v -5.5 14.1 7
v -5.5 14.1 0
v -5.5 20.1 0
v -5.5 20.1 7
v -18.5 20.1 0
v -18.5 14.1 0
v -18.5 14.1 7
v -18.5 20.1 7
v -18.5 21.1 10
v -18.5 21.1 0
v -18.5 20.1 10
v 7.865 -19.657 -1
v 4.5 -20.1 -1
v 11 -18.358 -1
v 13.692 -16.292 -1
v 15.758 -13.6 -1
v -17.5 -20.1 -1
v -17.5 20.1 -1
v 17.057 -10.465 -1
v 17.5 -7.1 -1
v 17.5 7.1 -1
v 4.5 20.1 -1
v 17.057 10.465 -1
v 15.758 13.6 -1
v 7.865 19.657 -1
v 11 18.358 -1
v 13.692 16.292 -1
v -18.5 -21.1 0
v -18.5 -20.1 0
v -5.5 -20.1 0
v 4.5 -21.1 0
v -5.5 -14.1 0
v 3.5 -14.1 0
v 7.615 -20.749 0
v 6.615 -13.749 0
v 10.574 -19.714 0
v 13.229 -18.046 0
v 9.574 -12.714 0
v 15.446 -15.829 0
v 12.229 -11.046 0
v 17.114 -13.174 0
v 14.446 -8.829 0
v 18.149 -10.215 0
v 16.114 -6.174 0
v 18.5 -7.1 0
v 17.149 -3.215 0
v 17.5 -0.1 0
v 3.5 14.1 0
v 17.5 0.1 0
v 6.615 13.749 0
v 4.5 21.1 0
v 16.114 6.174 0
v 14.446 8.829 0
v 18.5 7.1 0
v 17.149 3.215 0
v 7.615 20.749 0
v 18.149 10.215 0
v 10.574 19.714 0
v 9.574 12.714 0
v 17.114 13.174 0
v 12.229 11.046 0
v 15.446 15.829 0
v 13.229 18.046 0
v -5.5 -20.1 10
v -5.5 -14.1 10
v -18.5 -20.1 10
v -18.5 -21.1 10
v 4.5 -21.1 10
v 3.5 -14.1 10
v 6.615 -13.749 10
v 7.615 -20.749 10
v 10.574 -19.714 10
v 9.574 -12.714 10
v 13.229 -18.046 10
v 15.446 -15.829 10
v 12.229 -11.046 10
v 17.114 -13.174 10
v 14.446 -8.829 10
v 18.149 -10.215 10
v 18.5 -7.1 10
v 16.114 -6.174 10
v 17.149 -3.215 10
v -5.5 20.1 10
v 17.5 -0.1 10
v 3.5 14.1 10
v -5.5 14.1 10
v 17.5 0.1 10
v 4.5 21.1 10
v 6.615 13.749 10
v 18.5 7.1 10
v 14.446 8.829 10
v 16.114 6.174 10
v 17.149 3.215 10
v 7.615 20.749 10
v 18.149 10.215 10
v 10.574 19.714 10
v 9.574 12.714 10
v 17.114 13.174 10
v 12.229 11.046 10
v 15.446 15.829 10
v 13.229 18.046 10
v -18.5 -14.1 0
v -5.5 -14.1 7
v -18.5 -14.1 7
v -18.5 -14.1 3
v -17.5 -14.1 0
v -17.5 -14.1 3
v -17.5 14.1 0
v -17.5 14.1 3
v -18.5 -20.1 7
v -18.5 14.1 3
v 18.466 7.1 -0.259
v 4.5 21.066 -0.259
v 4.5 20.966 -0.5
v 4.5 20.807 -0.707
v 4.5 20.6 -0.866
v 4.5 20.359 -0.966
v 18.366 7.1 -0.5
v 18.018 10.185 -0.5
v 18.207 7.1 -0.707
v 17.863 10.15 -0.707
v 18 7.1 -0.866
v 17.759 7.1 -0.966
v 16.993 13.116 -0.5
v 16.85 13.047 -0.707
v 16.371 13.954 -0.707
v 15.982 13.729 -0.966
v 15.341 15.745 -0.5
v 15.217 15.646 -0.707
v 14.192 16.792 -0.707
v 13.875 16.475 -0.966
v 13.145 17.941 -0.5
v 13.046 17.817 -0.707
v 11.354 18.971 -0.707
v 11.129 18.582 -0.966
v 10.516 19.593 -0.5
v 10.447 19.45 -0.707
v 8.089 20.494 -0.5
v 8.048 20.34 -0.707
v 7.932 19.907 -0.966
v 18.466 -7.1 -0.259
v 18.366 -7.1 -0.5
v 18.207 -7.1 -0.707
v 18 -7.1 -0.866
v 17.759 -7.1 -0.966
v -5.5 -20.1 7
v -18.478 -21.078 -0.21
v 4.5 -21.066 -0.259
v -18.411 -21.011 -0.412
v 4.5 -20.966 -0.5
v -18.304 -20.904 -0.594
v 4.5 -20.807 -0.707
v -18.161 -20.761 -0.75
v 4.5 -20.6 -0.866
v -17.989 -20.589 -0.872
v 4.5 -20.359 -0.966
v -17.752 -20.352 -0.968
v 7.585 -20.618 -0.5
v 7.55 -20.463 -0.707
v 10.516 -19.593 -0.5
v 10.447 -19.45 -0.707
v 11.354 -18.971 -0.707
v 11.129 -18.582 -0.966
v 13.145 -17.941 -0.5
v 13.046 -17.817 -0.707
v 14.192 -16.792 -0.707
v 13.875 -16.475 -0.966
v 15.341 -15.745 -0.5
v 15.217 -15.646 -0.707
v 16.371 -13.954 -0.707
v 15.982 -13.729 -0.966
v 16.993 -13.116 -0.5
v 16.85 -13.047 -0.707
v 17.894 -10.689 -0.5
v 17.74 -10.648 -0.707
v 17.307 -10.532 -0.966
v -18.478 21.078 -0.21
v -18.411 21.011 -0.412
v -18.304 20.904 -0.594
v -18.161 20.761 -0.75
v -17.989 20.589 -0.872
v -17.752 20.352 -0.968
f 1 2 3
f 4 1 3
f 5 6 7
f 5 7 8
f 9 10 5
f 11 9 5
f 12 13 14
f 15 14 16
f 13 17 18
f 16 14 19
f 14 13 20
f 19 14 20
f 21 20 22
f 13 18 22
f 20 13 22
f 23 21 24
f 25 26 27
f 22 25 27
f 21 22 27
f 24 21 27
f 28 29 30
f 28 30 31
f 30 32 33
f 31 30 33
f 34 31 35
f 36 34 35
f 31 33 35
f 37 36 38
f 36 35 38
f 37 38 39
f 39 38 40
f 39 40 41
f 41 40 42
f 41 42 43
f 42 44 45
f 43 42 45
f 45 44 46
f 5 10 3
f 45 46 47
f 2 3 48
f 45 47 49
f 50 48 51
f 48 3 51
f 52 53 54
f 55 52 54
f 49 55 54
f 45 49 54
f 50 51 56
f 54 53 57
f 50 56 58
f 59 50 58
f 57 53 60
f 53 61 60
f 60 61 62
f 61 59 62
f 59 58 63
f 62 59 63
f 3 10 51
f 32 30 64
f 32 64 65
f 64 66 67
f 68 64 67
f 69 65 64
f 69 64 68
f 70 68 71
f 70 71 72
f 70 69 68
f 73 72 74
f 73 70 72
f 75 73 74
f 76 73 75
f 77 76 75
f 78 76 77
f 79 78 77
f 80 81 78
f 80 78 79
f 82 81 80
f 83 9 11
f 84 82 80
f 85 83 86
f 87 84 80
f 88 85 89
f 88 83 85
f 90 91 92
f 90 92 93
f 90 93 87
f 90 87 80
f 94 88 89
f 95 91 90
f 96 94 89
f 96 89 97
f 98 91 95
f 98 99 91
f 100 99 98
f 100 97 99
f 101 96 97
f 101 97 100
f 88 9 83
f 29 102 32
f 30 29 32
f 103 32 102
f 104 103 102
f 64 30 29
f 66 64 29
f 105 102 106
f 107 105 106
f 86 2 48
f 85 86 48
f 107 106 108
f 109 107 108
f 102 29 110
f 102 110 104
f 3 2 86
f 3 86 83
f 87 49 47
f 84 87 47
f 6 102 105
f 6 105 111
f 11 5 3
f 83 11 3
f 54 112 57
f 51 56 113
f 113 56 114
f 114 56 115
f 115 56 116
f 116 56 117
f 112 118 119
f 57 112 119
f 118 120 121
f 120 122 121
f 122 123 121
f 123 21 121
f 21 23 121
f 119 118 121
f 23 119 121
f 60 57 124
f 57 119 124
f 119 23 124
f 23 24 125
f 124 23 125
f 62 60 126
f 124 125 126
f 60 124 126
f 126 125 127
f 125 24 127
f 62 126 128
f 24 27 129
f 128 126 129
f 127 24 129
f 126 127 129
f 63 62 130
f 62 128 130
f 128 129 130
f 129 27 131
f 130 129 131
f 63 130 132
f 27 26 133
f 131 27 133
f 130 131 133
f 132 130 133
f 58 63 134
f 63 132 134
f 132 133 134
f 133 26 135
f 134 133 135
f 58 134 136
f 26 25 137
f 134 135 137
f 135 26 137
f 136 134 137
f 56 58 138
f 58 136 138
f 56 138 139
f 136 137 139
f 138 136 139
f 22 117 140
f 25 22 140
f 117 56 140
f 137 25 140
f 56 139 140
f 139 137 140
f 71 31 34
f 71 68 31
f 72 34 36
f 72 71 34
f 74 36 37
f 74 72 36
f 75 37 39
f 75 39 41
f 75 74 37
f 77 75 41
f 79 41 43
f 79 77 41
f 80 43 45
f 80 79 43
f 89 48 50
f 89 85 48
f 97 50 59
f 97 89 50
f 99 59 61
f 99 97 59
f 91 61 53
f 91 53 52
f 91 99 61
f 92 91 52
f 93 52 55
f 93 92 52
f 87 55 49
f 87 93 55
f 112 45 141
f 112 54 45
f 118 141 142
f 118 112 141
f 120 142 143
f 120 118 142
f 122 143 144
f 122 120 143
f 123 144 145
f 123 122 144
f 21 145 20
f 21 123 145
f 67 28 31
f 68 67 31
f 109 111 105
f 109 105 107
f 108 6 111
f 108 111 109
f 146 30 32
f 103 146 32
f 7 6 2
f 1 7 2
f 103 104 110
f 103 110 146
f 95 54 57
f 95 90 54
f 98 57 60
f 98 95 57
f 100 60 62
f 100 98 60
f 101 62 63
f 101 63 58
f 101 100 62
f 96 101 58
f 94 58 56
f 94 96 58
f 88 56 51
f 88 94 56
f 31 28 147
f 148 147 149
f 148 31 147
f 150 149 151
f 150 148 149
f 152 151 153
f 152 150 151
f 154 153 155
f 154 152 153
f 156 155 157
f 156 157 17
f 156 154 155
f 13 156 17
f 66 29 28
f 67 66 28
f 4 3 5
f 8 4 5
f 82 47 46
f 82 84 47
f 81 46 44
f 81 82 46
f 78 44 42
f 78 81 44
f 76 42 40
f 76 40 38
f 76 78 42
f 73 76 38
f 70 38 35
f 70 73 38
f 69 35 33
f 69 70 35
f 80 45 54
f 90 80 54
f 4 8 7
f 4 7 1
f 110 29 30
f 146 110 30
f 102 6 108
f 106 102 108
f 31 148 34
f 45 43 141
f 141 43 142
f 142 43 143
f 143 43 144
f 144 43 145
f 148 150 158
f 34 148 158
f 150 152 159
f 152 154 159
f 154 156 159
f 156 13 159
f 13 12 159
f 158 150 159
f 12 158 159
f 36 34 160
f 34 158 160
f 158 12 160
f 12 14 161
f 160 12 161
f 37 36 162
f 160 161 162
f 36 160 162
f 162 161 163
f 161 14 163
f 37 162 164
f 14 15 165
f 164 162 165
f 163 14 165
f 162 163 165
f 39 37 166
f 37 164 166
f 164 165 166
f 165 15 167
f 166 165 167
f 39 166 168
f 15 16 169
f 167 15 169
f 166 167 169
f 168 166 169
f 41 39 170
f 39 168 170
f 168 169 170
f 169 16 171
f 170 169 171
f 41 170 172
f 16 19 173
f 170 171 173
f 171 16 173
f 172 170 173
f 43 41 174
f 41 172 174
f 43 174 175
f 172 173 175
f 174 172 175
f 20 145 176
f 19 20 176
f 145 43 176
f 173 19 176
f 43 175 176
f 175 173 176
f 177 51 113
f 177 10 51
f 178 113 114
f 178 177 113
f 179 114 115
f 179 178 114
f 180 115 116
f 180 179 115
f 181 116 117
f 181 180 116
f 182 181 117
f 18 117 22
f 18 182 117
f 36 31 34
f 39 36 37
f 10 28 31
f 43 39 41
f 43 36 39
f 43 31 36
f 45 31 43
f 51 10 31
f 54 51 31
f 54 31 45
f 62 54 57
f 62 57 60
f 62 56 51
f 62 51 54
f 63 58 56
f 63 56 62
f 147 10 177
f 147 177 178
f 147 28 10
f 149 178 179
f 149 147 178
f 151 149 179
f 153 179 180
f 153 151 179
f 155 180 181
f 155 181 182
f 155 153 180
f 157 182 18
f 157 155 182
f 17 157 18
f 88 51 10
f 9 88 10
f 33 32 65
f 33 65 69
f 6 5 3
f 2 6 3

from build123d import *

# Parameters (mm, degrees)
F0_W     = 1
F0_H     = 28.2
F1_DEPTH = 3
F0_H_2   = 6
F0_W_2   = 12
F2_DEPTH = 7
F0_W_3   = 23
F3_DEPTH = 10
F4_DEPTH = 1
F5_R     = 14
F5_2_R   = 14
F6_R     = 0.99999


# Not quite as in the source:
# - a fillet or chamfer is up to 0.001 mm smaller than in the source, because OpenCascade refuses the exact size


with BuildPart() as f1:
    # F0 (on Top) → F1 (new body)
    with BuildSketch(Plane.XY):
        with Locations((-18, 0)):
            Rectangle(F0_W, F0_H)
    extrude(amount=F1_DEPTH)


with BuildPart() as f2:
    # F0 (on Top) → F2 (new body)
    with BuildSketch(Plane.XY):
        with Locations((-18, 17.1)):
            Rectangle(F0_W, F0_H_2)
        with Locations((-11.5, 17.1)):
            Rectangle(F0_W_2, F0_H_2)
    extrude(amount=F2_DEPTH)


with BuildPart() as f2b:
    # F0 (on Top) → F2, piece 2 (new body)
    with BuildSketch(Plane.XY):
        with Locations((-18, -17.1)):
            Rectangle(F0_W, F0_H_2)
        with Locations((-11.5, -17.1)):
            Rectangle(F0_W_2, F0_H_2)
    extrude(amount=F2_DEPTH)


with BuildPart() as f3:
    # F0 (on Top) → F3 (new body)
    with BuildSketch(Plane.XY):
        Polygon((17.5, -14.1), (17.5, -20.1), (-5.5, -20.1), (-17.5, -20.1), (-18.5, -20.1), (-18.5, -21.1), (18.5, -21.1), (18.5, 21.1), (-18.5, 21.1), (-18.5, 20.1), (-17.5, 20.1), (-5.5, 20.1), (17.5, 20.1), (17.5, 14.1), align=None)
        with Locations((6, 17.1)):
            Rectangle(F0_W_3, F0_H_2)
        with Locations((6, -17.1)):
            Rectangle(F0_W_3, F0_H_2)
    extrude(amount=F3_DEPTH)

    # F5
    f5_edges = [f3.edges().sort_by_distance(p)[0] for p in [
        (17.5, 14.1, 5),
        (17.5, -14.1, 5),
        (18.5, 21.1, 5),
        (18.5, -21.1, 5),
    ]]
    fillet(f5_edges, radius=F5_R)


with BuildPart() as f4:
    # F0 (on Top) → F4 (new body)
    with BuildSketch(Plane.XY):
        Polygon((-5.5, -14.1), (17.5, -14.1), (17.5, 14.1), (-5.5, 14.1), (-17.5, 14.1), (-17.5, -14.1), align=None)
        with Locations((-18, 17.1)):
            Rectangle(F0_W, F0_H_2)
        Polygon((17.5, -14.1), (17.5, -20.1), (-5.5, -20.1), (-17.5, -20.1), (-18.5, -20.1), (-18.5, -21.1), (18.5, -21.1), (18.5, 21.1), (-18.5, 21.1), (-18.5, 20.1), (-17.5, 20.1), (-5.5, 20.1), (17.5, 20.1), (17.5, 14.1), align=None)
        with Locations((-11.5, 17.1)):
            Rectangle(F0_W_2, F0_H_2)
        with Locations((6, 17.1)):
            Rectangle(F0_W_3, F0_H_2)
        with Locations((-18, 0)):
            Rectangle(F0_W, F0_H)
        with Locations((-18, -17.1)):
            Rectangle(F0_W, F0_H_2)
        with Locations((-11.5, -17.1)):
            Rectangle(F0_W_2, F0_H_2)
        with Locations((6, -17.1)):
            Rectangle(F0_W_3, F0_H_2)
    extrude(amount=-F4_DEPTH)

    # F5#2
    f5_2_edges = [f4.edges().sort_by_distance(p)[0] for p in [
        (18.5, 21.1, -0.5),
        (18.5, -21.1, -0.5),
    ]]
    fillet(f5_2_edges, radius=F5_2_R)

    # F6 (radius 1 in the source; OpenCascade refuses exactly that, so slightly less here)
    f6_edges = [f4.edges().sort_by_distance(p)[0] for p in [
        (-7, -21.1, -1),
        (-18.5, 0, -1),
    ]]
    fillet(f6_edges, radius=F6_R)


solid = Compound([f1.part, f2.part, f2b.part, f3.part, f4.part])
